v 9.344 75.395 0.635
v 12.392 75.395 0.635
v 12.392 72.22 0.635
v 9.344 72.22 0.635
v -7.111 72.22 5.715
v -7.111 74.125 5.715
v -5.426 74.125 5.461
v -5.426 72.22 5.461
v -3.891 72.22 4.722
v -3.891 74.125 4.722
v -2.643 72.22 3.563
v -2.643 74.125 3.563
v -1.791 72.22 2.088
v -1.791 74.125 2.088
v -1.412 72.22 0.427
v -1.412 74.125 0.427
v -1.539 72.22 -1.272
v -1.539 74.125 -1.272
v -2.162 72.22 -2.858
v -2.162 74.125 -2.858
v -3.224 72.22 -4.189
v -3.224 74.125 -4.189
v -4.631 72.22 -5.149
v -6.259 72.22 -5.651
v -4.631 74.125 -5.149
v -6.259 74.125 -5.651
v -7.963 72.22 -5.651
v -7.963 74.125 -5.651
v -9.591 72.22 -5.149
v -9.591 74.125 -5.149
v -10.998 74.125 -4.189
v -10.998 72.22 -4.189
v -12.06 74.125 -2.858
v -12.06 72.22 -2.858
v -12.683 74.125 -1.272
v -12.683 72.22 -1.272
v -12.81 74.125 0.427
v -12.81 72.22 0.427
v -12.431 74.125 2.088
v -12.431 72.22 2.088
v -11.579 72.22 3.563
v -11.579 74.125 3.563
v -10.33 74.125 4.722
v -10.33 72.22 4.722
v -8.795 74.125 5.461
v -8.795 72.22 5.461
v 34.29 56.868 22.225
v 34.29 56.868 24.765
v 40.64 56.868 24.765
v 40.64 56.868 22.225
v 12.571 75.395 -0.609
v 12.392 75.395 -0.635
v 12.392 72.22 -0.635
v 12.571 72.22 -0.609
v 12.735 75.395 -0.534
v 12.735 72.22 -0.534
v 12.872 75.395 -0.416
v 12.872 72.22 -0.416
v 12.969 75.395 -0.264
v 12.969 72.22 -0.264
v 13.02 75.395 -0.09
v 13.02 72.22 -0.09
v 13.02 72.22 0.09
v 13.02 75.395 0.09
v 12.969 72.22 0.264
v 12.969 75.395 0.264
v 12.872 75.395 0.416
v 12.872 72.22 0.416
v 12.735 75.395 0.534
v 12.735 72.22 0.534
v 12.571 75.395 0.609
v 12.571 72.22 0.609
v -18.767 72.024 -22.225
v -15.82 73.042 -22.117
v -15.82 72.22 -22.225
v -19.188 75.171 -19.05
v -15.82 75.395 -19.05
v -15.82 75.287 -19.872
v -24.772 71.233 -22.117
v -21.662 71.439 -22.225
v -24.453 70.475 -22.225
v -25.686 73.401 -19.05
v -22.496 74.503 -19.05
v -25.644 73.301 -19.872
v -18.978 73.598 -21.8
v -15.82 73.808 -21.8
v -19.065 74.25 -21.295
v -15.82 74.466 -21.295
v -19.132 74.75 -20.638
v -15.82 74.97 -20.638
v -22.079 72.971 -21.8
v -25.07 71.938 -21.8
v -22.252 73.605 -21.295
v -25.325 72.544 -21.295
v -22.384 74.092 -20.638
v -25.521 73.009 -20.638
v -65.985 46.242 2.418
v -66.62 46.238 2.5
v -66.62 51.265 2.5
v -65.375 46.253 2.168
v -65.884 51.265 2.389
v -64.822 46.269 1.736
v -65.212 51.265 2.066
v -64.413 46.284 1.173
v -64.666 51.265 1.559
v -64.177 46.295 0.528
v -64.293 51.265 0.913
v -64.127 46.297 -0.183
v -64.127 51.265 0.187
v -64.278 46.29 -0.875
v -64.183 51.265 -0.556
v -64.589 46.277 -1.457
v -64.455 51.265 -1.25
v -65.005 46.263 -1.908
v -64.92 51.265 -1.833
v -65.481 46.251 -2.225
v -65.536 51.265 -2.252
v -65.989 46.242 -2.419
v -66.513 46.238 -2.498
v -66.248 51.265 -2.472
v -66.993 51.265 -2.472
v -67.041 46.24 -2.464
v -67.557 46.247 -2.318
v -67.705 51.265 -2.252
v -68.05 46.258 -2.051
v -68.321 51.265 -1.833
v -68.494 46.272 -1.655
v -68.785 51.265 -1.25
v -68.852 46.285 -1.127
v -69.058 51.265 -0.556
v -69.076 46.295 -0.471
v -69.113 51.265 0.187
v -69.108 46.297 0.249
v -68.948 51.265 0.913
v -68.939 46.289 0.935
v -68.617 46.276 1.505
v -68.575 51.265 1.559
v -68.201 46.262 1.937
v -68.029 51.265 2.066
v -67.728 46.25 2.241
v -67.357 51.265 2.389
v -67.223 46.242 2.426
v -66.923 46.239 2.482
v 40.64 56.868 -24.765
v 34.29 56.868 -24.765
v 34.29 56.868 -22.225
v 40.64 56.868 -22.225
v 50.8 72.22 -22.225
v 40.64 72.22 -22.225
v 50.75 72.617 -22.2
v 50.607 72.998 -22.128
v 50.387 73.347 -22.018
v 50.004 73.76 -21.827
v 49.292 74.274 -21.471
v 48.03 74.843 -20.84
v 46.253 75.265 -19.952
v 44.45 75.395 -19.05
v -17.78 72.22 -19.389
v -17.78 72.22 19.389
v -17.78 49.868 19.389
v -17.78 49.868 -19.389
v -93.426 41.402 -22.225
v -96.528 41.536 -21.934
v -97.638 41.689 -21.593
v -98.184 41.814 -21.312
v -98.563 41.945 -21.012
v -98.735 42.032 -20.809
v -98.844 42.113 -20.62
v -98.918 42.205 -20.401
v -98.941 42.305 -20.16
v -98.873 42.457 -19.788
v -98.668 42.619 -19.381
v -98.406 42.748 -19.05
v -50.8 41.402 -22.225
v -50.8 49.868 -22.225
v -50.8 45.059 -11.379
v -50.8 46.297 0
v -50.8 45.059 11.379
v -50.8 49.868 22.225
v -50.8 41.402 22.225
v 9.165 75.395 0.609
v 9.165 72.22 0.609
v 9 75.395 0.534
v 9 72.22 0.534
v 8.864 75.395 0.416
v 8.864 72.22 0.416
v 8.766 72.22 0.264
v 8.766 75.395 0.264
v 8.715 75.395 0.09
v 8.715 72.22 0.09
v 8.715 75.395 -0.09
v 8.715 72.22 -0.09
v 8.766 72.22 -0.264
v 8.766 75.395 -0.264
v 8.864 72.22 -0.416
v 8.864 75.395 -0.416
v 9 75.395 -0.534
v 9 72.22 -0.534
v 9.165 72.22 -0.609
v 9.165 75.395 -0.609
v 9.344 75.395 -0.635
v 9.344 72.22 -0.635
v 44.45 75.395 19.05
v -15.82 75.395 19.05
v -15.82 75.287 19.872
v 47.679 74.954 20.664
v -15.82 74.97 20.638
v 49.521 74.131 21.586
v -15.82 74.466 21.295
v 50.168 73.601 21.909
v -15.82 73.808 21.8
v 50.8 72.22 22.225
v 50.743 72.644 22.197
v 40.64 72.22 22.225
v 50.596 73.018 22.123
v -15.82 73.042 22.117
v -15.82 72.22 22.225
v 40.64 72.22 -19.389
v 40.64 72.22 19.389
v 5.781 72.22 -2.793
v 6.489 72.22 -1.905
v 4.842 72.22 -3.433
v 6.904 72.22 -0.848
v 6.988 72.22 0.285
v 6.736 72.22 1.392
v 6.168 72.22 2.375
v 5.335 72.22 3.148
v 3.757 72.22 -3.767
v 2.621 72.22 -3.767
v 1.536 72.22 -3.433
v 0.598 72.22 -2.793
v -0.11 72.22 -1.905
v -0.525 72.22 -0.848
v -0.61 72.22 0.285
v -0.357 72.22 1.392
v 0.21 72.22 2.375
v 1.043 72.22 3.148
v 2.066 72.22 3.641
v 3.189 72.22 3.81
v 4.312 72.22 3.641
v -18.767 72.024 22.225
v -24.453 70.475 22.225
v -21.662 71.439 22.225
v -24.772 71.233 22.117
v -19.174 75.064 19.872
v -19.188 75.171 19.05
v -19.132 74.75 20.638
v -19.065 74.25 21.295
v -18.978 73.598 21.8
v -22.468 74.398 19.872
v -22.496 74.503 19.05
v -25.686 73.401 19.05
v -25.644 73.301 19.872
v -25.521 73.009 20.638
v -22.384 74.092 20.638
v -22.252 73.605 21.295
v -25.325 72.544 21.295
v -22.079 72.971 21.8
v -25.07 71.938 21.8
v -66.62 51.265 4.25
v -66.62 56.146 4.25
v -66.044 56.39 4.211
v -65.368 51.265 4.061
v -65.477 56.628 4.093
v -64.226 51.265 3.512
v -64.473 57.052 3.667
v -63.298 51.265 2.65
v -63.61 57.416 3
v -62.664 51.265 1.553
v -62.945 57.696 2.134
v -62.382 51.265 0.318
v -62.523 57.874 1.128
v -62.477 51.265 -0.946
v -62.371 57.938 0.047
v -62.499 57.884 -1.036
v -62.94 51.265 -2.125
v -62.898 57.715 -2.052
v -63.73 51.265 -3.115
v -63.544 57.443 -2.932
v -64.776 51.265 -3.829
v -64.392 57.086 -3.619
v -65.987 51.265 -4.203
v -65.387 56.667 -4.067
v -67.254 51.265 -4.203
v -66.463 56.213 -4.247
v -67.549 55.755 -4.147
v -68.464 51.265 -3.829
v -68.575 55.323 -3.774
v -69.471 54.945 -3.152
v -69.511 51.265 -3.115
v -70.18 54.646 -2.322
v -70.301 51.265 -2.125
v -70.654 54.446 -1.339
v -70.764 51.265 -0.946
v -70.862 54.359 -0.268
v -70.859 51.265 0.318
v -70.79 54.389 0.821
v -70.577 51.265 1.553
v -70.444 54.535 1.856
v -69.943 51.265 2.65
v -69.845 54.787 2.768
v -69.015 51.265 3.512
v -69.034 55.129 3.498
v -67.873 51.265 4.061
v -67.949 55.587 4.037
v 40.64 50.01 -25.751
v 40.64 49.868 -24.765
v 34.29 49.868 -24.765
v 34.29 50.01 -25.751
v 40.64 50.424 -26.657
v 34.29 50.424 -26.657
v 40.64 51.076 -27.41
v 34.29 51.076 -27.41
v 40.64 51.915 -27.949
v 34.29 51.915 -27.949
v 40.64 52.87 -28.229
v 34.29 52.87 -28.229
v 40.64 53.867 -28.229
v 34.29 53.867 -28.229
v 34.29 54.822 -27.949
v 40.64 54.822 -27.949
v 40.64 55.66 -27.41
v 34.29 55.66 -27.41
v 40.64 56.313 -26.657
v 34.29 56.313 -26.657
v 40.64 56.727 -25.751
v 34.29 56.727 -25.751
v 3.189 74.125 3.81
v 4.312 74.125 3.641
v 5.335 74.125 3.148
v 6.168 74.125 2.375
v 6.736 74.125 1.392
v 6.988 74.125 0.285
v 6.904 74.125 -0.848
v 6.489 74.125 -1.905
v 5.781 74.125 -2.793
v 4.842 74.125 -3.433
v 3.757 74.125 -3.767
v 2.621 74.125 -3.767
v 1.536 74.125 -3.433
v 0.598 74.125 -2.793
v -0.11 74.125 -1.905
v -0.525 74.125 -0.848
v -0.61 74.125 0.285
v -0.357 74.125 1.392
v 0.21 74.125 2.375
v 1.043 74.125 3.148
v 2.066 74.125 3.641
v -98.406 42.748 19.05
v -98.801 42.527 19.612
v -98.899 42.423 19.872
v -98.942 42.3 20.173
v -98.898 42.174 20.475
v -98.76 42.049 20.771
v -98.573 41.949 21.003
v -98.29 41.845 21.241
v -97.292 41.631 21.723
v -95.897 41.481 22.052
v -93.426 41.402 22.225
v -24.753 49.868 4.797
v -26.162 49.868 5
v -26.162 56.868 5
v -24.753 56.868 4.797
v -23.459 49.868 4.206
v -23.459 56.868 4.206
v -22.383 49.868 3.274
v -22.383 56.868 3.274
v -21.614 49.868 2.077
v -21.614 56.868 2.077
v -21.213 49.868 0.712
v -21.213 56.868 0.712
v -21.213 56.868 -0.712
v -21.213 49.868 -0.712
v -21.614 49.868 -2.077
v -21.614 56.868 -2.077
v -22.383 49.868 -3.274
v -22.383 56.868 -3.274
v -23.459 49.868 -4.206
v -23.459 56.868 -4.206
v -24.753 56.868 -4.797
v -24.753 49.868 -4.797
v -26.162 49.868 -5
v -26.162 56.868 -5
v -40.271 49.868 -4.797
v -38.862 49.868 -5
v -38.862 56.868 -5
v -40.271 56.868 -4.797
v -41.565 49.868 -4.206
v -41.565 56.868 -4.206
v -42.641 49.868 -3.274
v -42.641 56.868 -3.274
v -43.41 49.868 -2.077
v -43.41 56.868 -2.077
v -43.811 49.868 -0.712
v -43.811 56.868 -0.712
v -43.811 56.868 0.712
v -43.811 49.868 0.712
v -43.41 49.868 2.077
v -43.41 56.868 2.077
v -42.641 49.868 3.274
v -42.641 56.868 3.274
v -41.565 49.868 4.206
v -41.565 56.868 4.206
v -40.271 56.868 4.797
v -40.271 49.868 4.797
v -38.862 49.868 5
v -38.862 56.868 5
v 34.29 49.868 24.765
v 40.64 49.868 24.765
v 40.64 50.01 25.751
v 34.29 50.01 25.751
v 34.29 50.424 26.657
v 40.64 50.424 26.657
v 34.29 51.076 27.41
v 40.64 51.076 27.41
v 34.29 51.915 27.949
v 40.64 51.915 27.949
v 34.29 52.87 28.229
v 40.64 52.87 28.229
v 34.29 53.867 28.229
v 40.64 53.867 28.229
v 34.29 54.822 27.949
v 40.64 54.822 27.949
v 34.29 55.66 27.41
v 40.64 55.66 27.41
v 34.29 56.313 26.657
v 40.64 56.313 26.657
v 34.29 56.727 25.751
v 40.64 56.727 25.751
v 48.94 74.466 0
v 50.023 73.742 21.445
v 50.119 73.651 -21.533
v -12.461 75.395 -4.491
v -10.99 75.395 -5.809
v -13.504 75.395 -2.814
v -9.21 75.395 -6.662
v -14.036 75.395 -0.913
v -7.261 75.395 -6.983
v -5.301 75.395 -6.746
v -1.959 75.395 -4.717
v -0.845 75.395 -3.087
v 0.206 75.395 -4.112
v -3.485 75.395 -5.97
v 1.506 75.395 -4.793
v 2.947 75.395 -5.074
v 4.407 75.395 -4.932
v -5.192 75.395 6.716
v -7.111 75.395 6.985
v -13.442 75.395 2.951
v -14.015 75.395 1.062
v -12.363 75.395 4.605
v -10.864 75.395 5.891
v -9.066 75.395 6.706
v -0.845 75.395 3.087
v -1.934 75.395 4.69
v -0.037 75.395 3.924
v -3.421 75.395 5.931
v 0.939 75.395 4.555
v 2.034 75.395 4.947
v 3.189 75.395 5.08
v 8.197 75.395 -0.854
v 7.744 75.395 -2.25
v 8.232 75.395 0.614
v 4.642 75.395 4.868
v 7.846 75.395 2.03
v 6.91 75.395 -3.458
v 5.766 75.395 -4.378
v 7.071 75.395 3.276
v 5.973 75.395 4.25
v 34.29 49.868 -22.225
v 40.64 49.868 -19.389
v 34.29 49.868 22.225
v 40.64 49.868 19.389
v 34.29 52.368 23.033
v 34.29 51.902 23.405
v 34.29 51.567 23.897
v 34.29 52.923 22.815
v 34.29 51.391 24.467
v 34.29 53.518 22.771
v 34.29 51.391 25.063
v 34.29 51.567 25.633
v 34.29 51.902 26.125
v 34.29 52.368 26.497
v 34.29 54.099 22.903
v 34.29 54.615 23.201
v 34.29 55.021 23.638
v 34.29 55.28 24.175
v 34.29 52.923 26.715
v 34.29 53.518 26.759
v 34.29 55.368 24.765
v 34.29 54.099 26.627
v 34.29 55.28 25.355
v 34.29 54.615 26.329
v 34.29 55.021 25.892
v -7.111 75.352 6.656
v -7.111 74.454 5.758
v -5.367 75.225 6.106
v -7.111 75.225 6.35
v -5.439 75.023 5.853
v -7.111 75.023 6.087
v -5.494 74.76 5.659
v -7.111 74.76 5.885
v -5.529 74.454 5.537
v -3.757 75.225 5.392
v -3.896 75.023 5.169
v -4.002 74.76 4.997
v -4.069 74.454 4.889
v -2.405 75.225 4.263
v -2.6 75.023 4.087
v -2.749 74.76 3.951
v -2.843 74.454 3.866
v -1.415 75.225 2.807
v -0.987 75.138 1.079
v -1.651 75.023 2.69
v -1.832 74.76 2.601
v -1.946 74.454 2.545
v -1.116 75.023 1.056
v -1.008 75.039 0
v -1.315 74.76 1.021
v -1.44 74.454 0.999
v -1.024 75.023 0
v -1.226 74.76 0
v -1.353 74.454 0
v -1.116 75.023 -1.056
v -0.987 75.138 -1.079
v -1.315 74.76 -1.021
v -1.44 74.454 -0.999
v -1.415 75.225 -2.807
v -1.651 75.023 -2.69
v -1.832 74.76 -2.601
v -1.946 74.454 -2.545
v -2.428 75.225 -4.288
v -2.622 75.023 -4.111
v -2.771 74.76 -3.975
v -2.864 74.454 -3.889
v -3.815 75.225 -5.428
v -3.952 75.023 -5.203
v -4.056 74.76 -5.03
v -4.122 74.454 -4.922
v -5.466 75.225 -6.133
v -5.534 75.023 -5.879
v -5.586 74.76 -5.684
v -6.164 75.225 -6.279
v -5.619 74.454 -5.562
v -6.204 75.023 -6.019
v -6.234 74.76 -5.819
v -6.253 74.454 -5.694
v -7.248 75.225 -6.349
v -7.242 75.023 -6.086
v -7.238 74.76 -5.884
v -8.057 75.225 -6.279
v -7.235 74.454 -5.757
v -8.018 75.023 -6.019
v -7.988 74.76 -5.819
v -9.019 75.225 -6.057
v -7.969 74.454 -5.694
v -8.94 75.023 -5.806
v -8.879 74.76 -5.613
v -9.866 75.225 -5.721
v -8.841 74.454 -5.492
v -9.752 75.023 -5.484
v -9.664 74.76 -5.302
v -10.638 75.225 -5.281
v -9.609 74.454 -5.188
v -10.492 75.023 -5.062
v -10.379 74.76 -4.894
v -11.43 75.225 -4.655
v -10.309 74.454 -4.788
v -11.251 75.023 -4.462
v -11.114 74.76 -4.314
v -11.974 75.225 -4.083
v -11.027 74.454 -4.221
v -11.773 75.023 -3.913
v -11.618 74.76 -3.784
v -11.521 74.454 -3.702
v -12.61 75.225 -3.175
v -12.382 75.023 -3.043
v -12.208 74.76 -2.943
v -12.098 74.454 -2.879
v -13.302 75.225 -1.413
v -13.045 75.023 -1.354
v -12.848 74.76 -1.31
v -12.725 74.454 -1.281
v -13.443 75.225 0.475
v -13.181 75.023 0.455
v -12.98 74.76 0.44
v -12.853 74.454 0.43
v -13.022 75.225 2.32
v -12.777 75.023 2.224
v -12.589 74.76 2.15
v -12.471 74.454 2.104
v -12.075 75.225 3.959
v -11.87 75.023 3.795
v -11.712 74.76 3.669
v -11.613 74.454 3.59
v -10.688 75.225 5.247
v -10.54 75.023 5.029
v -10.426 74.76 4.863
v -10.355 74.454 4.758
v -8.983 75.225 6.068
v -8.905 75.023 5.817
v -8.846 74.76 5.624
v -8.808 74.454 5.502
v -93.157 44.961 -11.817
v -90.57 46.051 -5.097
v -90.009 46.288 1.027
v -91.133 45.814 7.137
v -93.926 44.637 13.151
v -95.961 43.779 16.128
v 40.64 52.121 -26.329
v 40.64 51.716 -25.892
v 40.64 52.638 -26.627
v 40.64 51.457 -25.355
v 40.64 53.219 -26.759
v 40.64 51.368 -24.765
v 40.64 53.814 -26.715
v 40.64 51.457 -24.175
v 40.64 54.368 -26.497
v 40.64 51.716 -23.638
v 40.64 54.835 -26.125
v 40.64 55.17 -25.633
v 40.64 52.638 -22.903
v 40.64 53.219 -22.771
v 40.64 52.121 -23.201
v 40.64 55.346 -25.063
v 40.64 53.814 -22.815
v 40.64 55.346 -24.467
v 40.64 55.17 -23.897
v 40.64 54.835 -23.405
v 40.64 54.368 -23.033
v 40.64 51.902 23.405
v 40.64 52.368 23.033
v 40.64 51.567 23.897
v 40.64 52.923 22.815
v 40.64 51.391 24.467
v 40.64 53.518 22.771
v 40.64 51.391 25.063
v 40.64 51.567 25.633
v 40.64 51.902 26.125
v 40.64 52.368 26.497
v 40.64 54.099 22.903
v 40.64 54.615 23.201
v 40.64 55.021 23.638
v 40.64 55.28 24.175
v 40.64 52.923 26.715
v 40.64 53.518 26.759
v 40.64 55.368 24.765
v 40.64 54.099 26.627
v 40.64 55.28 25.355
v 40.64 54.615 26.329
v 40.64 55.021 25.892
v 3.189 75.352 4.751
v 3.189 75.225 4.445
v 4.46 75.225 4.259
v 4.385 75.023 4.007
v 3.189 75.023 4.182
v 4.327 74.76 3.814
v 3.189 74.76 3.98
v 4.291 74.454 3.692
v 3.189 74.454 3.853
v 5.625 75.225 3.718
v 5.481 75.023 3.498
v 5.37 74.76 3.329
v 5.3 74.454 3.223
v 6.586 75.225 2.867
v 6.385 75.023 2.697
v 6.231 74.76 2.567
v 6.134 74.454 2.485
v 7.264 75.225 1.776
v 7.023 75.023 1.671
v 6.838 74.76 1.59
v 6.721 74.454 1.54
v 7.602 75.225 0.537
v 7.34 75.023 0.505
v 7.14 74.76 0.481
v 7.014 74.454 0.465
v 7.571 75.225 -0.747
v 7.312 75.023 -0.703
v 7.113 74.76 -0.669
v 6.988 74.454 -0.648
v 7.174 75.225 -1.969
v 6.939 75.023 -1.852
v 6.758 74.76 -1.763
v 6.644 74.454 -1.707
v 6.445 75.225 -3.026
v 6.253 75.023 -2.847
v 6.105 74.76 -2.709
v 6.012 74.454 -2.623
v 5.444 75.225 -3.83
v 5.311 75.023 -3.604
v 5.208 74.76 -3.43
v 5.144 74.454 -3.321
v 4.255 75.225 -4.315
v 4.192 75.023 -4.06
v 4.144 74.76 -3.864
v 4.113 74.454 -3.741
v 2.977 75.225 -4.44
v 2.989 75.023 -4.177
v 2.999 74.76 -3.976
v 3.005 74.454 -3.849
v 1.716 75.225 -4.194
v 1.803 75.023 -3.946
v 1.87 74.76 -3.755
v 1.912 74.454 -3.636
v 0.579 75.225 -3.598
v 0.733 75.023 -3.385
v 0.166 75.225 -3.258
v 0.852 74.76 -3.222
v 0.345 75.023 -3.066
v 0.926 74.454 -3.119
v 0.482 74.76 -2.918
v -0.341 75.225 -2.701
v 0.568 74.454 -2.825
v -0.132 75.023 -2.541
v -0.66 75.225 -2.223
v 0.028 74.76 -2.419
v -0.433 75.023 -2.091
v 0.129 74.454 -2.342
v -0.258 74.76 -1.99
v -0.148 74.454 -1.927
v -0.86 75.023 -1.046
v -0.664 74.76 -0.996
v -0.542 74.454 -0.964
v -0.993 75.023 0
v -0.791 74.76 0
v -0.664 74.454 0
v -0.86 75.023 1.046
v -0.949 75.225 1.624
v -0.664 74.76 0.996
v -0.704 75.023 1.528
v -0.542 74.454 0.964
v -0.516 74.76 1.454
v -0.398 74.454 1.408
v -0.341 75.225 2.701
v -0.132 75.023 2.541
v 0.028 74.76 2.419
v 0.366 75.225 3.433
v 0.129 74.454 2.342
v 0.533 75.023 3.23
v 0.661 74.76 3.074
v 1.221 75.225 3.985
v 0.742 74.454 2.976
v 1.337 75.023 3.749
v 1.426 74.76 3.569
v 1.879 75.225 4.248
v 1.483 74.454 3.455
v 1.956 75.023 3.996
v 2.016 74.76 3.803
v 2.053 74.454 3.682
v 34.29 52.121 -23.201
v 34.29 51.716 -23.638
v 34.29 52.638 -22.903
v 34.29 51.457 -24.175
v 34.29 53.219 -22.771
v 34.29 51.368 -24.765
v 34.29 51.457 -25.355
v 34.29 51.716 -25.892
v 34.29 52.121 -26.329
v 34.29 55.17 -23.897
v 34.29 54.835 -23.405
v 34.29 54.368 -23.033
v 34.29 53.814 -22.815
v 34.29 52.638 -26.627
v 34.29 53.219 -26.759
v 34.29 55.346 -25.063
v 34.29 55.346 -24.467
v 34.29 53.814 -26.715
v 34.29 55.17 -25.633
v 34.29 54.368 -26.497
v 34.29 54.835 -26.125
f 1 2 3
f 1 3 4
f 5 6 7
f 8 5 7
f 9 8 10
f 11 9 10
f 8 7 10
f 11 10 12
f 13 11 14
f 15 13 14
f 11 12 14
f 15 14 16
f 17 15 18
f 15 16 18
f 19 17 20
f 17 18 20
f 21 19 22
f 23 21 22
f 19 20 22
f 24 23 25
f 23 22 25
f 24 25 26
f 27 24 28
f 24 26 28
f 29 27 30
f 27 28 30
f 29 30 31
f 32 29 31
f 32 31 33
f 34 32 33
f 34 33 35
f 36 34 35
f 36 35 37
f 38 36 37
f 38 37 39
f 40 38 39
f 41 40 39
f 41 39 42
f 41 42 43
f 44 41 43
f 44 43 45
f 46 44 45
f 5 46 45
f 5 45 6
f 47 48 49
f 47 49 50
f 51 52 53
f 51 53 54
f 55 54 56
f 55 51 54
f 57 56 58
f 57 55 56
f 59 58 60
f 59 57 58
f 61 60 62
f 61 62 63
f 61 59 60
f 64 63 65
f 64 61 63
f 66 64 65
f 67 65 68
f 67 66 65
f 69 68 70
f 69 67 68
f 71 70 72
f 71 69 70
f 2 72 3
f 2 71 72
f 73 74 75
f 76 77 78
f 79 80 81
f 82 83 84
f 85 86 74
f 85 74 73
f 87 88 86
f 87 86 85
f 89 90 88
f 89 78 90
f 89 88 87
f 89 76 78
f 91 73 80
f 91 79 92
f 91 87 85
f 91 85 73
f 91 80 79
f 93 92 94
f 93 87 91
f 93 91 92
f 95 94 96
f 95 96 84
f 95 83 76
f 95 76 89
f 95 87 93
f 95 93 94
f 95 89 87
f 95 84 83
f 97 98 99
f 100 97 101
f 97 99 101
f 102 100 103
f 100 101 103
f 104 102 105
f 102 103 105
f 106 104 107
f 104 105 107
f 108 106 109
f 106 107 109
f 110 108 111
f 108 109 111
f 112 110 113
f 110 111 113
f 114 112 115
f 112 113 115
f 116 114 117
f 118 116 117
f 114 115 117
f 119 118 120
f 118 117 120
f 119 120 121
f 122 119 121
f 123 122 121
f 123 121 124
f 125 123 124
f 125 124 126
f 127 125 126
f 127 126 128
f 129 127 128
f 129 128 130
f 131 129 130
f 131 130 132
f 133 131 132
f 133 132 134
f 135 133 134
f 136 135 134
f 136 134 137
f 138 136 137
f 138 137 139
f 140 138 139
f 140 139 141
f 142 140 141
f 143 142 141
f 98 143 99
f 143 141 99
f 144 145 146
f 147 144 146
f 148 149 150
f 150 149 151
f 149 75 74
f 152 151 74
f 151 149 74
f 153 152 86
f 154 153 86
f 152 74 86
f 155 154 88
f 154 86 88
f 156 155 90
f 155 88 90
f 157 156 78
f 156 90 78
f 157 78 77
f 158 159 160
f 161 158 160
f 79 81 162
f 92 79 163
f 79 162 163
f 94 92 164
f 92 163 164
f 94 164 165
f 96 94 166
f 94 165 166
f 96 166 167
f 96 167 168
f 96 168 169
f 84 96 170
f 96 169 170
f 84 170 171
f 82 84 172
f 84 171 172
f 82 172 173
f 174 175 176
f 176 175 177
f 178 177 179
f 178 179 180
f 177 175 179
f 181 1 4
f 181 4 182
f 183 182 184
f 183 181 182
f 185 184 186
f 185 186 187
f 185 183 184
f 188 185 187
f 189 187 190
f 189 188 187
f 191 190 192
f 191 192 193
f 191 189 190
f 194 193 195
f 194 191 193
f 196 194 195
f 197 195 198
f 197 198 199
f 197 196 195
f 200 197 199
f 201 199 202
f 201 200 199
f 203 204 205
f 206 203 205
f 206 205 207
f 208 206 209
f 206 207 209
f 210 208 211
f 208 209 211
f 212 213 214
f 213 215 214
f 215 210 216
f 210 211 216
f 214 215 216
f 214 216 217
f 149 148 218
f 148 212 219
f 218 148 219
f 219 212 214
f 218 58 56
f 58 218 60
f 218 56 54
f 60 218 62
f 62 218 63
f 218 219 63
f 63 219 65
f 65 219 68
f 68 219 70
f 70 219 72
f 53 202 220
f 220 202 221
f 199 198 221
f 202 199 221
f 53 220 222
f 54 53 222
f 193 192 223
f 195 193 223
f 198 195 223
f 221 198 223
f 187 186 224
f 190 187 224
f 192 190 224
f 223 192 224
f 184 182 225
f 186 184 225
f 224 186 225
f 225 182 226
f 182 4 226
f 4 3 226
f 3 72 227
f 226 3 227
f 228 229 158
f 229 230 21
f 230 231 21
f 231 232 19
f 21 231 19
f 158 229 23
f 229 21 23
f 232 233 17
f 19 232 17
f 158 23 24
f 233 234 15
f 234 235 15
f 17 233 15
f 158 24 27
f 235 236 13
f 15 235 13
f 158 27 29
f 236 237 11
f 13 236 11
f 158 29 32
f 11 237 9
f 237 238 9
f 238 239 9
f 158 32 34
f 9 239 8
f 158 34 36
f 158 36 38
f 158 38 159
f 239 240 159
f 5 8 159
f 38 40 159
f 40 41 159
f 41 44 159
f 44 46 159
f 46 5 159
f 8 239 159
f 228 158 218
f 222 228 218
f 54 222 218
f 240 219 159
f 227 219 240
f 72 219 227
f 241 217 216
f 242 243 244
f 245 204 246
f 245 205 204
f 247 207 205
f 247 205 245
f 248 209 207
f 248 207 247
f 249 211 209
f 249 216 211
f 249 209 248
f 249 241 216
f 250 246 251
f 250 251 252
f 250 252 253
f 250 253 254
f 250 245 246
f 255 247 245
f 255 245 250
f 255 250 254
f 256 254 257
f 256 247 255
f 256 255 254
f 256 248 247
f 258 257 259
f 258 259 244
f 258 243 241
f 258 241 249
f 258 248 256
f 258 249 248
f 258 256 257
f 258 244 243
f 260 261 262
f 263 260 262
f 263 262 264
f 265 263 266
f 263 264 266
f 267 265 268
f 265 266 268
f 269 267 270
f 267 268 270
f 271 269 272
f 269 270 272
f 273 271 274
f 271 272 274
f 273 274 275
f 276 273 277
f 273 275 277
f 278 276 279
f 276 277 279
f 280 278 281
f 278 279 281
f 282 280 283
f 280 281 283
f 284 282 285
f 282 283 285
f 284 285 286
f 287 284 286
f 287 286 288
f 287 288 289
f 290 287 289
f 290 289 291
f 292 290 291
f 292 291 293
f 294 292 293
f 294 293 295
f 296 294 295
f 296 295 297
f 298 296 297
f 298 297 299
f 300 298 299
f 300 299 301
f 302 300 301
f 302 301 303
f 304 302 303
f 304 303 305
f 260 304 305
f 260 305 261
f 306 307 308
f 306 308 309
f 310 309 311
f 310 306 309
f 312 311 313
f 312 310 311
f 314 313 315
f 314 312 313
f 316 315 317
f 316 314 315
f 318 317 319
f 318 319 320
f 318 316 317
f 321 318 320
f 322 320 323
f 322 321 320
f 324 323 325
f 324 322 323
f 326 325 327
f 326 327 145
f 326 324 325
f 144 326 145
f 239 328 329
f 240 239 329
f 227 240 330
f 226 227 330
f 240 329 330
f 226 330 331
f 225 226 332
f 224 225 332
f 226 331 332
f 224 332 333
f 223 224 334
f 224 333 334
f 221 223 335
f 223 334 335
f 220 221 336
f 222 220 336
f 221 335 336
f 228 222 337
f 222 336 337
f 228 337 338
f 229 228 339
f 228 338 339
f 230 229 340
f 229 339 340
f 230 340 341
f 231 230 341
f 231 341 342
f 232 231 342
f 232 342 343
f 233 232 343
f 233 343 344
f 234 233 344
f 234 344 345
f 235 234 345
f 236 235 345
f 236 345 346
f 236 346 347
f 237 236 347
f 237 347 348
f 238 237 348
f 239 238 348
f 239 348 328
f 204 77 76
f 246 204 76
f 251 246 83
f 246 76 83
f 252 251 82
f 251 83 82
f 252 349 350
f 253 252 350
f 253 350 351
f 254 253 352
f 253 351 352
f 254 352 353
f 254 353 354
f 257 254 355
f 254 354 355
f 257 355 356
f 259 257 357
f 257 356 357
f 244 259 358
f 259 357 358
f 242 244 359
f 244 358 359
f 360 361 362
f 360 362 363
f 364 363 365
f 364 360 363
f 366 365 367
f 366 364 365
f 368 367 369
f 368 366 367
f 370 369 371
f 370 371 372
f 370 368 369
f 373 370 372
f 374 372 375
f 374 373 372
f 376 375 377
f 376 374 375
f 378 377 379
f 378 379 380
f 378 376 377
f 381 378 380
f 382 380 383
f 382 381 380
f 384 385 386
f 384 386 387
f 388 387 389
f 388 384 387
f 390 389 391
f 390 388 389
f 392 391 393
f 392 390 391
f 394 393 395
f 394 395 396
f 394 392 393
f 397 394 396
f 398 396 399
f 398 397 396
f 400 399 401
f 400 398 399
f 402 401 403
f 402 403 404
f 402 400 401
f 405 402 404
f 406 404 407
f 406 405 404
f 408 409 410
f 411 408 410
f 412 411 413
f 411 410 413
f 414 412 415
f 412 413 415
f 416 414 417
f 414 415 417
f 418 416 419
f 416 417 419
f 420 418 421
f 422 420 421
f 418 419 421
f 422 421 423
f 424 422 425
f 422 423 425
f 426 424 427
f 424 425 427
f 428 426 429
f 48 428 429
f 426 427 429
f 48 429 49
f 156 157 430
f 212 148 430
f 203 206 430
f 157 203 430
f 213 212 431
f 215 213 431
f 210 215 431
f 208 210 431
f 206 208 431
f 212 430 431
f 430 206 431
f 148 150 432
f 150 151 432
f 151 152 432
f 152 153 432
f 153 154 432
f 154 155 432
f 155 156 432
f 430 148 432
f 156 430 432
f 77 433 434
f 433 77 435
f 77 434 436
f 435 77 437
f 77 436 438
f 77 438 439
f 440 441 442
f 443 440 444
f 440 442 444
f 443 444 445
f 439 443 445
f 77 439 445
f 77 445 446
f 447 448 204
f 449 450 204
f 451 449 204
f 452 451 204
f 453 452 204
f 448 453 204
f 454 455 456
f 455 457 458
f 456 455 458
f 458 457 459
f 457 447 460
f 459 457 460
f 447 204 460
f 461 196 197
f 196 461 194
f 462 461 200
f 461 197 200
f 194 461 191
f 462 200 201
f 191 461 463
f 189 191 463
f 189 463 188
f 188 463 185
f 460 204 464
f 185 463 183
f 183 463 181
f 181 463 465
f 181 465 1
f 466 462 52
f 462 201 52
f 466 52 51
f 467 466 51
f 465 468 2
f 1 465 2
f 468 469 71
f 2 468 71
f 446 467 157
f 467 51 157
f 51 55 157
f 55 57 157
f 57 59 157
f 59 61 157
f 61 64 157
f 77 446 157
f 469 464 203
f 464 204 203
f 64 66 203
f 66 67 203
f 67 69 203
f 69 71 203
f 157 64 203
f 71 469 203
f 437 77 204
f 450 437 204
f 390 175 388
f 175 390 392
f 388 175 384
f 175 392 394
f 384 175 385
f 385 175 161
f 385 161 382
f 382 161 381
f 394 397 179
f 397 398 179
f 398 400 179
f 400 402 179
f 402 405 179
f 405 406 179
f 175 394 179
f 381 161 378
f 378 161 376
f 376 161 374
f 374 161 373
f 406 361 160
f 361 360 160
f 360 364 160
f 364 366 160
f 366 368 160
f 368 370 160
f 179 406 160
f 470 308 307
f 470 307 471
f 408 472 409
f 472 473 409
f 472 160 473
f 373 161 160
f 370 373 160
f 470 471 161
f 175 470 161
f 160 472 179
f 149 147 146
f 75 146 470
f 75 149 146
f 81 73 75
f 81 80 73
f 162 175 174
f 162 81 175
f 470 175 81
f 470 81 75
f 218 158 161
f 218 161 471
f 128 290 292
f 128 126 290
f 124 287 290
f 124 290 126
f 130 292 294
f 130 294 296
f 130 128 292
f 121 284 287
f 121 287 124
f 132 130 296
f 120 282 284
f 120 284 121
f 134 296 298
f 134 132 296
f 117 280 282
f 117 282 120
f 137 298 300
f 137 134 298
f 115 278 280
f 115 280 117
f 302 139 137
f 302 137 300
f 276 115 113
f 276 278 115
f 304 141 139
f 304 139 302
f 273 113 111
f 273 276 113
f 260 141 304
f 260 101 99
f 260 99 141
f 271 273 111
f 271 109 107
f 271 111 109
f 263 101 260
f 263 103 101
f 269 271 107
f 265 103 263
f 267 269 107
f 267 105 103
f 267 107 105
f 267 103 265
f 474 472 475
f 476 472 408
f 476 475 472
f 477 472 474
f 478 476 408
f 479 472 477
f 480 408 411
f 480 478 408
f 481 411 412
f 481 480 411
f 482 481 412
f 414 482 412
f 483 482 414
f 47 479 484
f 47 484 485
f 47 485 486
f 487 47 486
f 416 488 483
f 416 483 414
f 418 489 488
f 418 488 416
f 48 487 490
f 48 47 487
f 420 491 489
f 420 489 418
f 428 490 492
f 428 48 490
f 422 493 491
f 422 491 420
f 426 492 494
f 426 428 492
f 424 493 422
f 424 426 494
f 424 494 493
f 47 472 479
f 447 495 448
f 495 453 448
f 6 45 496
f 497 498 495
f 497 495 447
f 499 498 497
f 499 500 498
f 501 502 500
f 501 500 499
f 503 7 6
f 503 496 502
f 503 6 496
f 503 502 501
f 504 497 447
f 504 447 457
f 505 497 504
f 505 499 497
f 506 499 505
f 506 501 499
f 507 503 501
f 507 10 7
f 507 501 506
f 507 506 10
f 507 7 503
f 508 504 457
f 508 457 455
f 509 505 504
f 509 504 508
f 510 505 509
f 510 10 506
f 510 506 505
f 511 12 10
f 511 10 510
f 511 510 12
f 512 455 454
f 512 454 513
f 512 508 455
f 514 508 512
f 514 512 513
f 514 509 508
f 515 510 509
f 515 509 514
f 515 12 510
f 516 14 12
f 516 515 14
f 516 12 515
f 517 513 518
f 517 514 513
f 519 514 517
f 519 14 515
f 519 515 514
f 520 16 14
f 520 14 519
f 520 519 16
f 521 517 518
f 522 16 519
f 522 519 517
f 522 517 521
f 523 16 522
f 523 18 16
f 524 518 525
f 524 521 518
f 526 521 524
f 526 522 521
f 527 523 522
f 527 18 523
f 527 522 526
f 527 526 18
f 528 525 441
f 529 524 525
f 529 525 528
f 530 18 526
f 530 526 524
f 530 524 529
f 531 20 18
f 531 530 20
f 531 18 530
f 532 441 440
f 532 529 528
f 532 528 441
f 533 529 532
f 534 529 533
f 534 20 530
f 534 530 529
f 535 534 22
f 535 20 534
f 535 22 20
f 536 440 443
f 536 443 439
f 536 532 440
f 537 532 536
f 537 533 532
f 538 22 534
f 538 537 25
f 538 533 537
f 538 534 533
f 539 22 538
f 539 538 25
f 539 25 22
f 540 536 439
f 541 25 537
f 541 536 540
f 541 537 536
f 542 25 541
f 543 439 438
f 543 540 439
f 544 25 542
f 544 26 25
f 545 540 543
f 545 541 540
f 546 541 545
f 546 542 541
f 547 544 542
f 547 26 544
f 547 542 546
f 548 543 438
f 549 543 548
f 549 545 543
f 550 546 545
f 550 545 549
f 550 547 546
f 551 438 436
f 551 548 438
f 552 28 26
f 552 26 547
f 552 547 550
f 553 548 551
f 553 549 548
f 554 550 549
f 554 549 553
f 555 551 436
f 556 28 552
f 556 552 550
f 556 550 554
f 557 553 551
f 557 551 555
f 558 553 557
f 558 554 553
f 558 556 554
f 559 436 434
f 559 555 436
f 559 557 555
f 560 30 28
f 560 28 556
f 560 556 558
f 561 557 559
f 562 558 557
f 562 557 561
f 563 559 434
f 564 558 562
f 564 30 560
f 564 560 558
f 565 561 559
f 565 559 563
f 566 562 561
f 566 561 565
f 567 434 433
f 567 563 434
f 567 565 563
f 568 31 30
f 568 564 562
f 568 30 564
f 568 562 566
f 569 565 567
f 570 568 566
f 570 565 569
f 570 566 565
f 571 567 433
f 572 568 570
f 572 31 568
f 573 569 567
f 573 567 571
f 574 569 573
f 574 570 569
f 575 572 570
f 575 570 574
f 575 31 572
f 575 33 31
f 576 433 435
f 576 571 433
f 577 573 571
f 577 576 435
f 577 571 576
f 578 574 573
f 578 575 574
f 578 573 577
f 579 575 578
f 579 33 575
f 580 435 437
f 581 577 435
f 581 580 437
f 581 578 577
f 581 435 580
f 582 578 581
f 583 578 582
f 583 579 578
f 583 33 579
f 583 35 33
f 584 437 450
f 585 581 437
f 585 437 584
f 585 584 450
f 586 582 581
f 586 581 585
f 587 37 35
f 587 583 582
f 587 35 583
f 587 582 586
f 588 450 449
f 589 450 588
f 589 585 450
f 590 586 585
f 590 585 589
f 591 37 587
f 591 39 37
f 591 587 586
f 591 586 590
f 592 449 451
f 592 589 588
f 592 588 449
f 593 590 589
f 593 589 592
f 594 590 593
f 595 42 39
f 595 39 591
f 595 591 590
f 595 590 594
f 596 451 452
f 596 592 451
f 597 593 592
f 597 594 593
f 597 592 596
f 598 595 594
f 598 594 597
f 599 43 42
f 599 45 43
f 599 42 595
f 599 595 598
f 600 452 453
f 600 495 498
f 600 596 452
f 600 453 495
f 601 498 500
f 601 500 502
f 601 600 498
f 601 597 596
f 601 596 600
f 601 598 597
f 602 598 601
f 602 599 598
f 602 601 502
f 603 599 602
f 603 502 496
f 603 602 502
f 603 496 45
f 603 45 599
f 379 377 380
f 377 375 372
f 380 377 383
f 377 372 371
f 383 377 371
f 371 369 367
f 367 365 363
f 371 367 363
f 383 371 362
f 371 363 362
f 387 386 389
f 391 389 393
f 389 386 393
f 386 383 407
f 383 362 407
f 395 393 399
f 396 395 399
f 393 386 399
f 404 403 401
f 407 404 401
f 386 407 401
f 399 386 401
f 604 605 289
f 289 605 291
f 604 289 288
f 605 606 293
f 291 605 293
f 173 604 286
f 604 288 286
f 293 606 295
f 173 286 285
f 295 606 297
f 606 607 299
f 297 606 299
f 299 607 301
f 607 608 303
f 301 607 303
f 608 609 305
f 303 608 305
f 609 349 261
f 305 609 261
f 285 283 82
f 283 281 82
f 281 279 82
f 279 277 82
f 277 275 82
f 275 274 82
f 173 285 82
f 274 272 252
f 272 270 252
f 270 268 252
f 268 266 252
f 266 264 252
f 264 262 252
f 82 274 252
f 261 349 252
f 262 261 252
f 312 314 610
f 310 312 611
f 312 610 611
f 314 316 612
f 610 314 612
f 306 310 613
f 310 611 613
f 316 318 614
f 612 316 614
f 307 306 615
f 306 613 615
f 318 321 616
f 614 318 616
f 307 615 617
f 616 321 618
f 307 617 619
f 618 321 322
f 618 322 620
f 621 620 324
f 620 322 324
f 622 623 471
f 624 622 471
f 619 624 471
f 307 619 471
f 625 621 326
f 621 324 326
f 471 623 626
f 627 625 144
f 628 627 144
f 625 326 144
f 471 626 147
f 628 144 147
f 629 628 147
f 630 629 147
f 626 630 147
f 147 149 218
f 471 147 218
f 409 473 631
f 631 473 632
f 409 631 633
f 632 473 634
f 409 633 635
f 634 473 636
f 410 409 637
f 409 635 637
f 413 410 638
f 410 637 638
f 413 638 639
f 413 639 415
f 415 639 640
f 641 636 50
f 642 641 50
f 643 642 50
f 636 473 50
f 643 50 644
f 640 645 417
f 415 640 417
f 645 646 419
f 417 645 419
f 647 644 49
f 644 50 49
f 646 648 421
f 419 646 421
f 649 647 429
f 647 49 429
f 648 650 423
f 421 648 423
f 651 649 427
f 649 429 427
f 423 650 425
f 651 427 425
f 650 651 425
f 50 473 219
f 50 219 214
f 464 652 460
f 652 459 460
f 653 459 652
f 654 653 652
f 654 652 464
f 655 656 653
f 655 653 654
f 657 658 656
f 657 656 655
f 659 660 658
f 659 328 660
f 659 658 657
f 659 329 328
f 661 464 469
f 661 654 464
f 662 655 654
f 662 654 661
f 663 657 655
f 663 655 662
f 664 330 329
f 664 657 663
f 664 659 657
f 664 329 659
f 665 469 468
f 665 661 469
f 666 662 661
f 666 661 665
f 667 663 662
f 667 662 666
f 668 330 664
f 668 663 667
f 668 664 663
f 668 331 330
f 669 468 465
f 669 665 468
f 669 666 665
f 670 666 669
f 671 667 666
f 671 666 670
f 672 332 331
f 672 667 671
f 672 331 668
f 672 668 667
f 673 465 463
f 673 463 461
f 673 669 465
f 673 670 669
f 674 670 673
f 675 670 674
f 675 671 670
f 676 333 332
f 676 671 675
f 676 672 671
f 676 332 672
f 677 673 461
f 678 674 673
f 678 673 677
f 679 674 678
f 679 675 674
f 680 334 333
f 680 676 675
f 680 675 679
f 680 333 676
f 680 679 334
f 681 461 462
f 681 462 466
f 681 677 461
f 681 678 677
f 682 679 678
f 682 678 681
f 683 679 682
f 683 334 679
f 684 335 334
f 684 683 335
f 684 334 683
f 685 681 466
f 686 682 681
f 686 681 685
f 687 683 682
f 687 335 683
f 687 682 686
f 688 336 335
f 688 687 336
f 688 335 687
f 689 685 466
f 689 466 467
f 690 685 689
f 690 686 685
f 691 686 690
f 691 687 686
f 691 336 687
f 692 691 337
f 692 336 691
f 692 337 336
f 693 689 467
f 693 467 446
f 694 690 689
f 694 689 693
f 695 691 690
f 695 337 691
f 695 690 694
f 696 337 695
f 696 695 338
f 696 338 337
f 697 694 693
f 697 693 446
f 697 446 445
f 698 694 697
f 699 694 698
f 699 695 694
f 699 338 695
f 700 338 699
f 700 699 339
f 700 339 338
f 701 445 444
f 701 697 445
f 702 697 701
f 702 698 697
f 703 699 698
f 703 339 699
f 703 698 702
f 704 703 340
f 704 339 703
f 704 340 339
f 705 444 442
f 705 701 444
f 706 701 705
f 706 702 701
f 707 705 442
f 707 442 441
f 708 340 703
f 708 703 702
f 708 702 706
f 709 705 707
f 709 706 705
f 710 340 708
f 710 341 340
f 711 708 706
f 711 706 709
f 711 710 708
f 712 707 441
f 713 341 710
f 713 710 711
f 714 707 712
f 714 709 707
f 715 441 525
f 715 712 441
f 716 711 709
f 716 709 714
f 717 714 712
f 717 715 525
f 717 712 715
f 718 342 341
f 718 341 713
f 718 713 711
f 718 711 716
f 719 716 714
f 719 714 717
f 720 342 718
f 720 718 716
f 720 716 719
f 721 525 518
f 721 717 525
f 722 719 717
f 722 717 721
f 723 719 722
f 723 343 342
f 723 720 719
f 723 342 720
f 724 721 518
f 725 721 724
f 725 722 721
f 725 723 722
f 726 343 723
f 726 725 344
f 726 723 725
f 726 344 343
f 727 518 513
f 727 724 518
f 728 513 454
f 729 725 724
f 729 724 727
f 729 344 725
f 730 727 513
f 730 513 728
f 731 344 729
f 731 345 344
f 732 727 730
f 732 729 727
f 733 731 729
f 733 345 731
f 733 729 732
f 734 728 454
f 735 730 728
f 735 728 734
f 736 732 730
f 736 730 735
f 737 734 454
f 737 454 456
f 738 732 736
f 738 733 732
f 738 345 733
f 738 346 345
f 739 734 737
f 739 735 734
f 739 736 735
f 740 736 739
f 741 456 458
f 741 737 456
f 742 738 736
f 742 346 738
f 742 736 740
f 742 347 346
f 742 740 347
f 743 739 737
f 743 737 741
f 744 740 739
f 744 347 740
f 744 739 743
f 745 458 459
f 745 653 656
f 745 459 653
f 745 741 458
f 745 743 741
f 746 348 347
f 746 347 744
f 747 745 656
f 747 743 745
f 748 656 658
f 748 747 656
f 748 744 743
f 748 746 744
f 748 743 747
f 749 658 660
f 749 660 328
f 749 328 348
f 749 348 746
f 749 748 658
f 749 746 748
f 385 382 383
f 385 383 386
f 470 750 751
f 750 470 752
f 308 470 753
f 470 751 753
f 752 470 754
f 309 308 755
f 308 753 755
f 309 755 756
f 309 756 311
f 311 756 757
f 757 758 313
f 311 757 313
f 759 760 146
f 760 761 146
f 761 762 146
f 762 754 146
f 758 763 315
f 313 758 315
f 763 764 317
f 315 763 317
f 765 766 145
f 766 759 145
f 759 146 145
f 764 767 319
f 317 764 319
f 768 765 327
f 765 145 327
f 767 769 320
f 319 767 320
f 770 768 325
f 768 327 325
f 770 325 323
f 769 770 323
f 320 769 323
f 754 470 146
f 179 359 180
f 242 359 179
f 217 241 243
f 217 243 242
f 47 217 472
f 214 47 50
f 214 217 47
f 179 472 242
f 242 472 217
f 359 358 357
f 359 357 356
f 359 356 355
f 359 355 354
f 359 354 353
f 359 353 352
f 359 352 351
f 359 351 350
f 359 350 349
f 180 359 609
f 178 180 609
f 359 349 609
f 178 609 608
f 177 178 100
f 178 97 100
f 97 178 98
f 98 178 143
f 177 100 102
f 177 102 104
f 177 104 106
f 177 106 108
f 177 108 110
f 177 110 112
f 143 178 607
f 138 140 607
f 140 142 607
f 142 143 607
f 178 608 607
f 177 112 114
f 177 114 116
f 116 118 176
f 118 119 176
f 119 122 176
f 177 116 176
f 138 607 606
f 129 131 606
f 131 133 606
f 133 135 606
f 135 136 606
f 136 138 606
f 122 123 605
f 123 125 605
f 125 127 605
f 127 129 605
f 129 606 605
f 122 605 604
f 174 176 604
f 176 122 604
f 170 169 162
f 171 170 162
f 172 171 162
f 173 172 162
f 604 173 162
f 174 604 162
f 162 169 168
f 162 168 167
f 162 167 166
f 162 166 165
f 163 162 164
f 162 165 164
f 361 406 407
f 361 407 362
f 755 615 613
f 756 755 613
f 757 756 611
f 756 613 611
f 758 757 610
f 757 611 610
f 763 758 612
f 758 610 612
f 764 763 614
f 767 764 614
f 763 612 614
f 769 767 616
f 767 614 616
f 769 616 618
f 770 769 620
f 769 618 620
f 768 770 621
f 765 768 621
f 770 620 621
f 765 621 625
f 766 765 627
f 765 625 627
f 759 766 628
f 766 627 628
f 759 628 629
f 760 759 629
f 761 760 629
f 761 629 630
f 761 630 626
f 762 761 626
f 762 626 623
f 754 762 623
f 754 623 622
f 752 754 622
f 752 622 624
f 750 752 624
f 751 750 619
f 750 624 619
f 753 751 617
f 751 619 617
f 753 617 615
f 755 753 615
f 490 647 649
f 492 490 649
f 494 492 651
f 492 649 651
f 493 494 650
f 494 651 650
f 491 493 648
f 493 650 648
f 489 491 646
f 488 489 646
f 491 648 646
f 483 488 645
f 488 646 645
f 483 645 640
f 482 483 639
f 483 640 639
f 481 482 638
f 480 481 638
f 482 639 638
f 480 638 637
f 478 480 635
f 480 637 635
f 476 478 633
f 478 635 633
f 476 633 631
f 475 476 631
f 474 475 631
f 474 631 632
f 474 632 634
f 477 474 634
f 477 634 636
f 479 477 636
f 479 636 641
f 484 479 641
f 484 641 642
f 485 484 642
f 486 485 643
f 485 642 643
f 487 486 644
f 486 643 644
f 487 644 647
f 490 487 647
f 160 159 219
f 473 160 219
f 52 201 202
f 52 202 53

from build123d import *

# Parameters (mm, degrees)
BOSS_EXTRUDE1_DEPTH     = 22.225
FILLET1_R               = 25.4
CUT_EXTRUDE1_DEPTH      = 129.456170755
CUT_EXTRUDE1_DEPTH_BACK = 129.456170755
SKETCH2_W               = 58.42
SKETCH2_H               = 2.835975014
BOSS_EXTRUDE2_DEPTH     = 22.352
FILLET2_SIZE            = 3.175
FILLET2_SIZE_2          = 6.35
SKETCH4_R               = 5.715
SKETCH4_R_2             = 3.81
CUT_EXTRUDE2_DEPTH      = 3.175
FILLET4_R               = 1.27
SKETCH5_R               = 2.5
CUT_EXTRUDE3_DEPTH      = 110.417000644
CUT_EXTRUDE5_DEPTH      = 7
SKETCH8_R               = 2
BOSS_EXTRUDE3_DEPTH     = 6.35
FILLET3_R               = 3.175
SKETCH6_R               = 4.25
CUT_EXTRUDE8_DEPTH      = 24.13


with BuildPart() as part:
    # Sketch1 → Boss-Extrude1 (new, symmetric)
    with BuildSketch(Plane.XY):
        Polygon((-17.78, 72.220471881), (-17.78, 49.868471881), (-50.8, 49.868471881), (-50.8, 41.401805214), (-101.6, 41.401805214), (-20.955, 75.395471881), (50.8, 75.395471881), (50.8, 72.220471881), align=None)
    extrude(amount=BOSS_EXTRUDE1_DEPTH, both=True)

    # Fillet1
    fillet1_edges = [part.edges().sort_by_distance(p)[0] for p in [
        (-20.955, 75.395471881, 0),
    ]]
    fillet(fillet1_edges, radius=FILLET1_R)

    # Sketch3 → Cut-Extrude1 (cut, two sides: drawn at the far end of the back side and taken through both)
    with BuildSketch(Plane(origin=(-50.8, 0, 0), x_dir=(0, 0, -1), z_dir=(1, 0, 0)).offset(-CUT_EXTRUDE1_DEPTH_BACK)):
        with BuildLine():
            Line((-132.858425435, -9.823961327), (-22.225, 41.401805214))
            ThreePointArc((-22.225, 41.401805214), (0, 46.297479222), (22.225, 41.401805214))
            Line((22.225, 41.401805214), (132.858425435, -9.823961327))
            Line((132.858425435, -9.823961327), (132.858425435, -253.658610064))
            Line((132.858425435, -253.658610064), (-132.858425435, -253.658610064))
            Line((-132.858425435, -253.658610064), (-132.858425435, -9.823961327))
        make_face()
    extrude(amount=CUT_EXTRUDE1_DEPTH + CUT_EXTRUDE1_DEPTH_BACK, mode=Mode.SUBTRACT)

    # Sketch2 → Boss-Extrude2 (add)
    with BuildSketch(Plane.XZ.offset(-72.220471881)):
        with Locations((11.43, 20.807012493)):
            Rectangle(SKETCH2_W, SKETCH2_H)
        with Locations((11.43, -20.807012493)):
            Rectangle(SKETCH2_W, SKETCH2_H)
    extrude(amount=BOSS_EXTRUDE2_DEPTH)

    # Fillet2
    # an asymmetric fillet: 6.35, 3.175 mm, written as the material it takes off along each edge
    with BuildSketch(Plane(origin=(50.8, 75.395471881, -38.1), x_dir=(0, -1, 0), z_dir=(0, 0, 1))) as fillet2_piece_1:
        with BuildLine():
            Bezier((FILLET2_SIZE, 0), (0, 0), (0, -FILLET2_SIZE_2), weights=[1, 0.707106781, 1])
            Line((0, -FILLET2_SIZE_2), (0, 0))
            Line((0, 0), (FILLET2_SIZE, 0))
        make_face()
    extrude(amount=76.2, mode=Mode.SUBTRACT)

    # Sketch4 → Cut-Extrude2 (cut)
    with BuildSketch(Plane(origin=(0, 75.395471881, 0), x_dir=(1, 0, 0), z_dir=(0, 1, 0))):
        with Locations(Location((-7.110857048, 0, 0), (0, 0, 270))):
            Circle(SKETCH4_R)
        with Locations(Location((3.189142952, 0, 0), (0, 0, 270))):
            Circle(SKETCH4_R_2)
        with BuildLine():
            Line((9.34361728, 0.635), (12.39161728, 0.635))
            ThreePointArc((12.39161728, 0.635), (13.02661728, 0), (12.39161728, -0.635))
            Line((12.39161728, -0.635), (9.34361728, -0.635))
            ThreePointArc((9.34361728, -0.635), (8.70861728, 0), (9.34361728, 0.635))
        make_face()
    extrude(amount=-CUT_EXTRUDE2_DEPTH, mode=Mode.SUBTRACT)

    # Fillet4
    # the kernel refuses this fillet: 1.27 mm, written as the material it takes off along each edge
    with BuildSketch(Plane(origin=(-7.110857048, 75.395471881, 0), x_dir=(0, 0, 1), z_dir=(-1, 0, 0))) as fillet4_piece_1:
        with BuildLine():
            CenterArc((5.715 + FILLET4_R, -FILLET4_R), FILLET4_R, 90, 90)
            Line((5.715, -FILLET4_R), (5.715, 0))
            Line((5.715, 0), (5.715 + FILLET4_R, 0))
        make_face()
    revolve(axis=Axis((-7.110857048, 75.395471881, 0), (0, 1, 0)), mode=Mode.SUBTRACT)
    with BuildSketch(Plane(origin=(3.189142952, 75.395471881, 0), x_dir=(0, 0, 1), z_dir=(-1, 0, 0))) as fillet4_piece_2:
        with BuildLine():
            CenterArc((3.81 + FILLET4_R, -FILLET4_R), FILLET4_R, 90, 90)
            Line((3.81, -FILLET4_R), (3.81, 0))
            Line((3.81, 0), (3.81 + FILLET4_R, 0))
        make_face()
    revolve(axis=Axis((3.189142952, 75.395471881, 0), (0, 1, 0)), mode=Mode.SUBTRACT)

    # Sketch5 → Cut-Extrude3 (cut, through all)
    with BuildSketch(Plane(origin=(0, 75.395471881, 0), x_dir=(1, 0, 0), z_dir=(0, 1, 0))):
        with Locations(Location((-66.620425581, 0, 0), (0, 0, 270))):
            Circle(SKETCH5_R)
    extrude(amount=-CUT_EXTRUDE3_DEPTH, mode=Mode.SUBTRACT)

    # Sketch7 → Cut-Extrude5 (cut)
    with BuildSketch(Plane.XZ.offset(-49.868471881)):
        with BuildLine():
            Line((-38.862, 5), (-26.162, 5))
            ThreePointArc((-26.162, 5), (-21.162, 0), (-26.162, -5))
            Line((-26.162, -5), (-38.862, -5))
            ThreePointArc((-38.862, -5), (-43.862, 0), (-38.862, 5))
        make_face()
    extrude(amount=-CUT_EXTRUDE5_DEPTH, mode=Mode.SUBTRACT)

    # Sketch8 → Boss-Extrude3 (add)
    # profile 1 of 2: a face of its own
    with BuildSketch(Plane(origin=(40.64, 0, 0), x_dir=(0, 0, -1), z_dir=(1, 0, 0))):
        with BuildLine():
            Line((-22.225, 49.868471881), (-24.765, 49.868471881))
            ThreePointArc((-24.765, 49.868471881), (-28.265, 53.368471881), (-24.765, 56.868471881))
            Line((-24.765, 56.868471881), (-22.225, 56.868471881))
            Line((-22.225, 56.868471881), (-22.225, 49.868471881))
        make_face()
        with Locations(Location((-24.765, 53.368471881, 0), (0, 0, 90))):
            Circle(SKETCH8_R, mode=Mode.SUBTRACT)
    # profile 2 of 2: a face of its own
    with BuildSketch(Plane(origin=(40.64, 0, 0), x_dir=(0, 0, -1), z_dir=(1, 0, 0))):
        with BuildLine():
            Line((22.225, 56.868471881), (22.225, 49.868471881))
            Line((22.225, 49.868471881), (24.765, 49.868471881))
            ThreePointArc((24.765, 49.868471881), (28.265, 53.368471881), (24.765, 56.868471881))
            Line((24.765, 56.868471881), (22.225, 56.868471881))
        make_face()
        with Locations(Location((24.765, 53.368471881, 0), (0, 0, 270))):
            Circle(SKETCH8_R, mode=Mode.SUBTRACT)
    extrude(amount=-BOSS_EXTRUDE3_DEPTH)

    # Fillet3
    # the kernel refuses this fillet: 3.175 mm, written as the material it takes off along each edge
    with BuildSketch(Plane(origin=(-15.820425581, 75.395471881, -22.225), x_dir=(0, -1, 0), z_dir=(1, 0, 0))) as fillet3_piece_1:
        with BuildLine():
            CenterArc((FILLET3_R, -FILLET3_R), FILLET3_R, 90, 90)
            Line((0, -FILLET3_R), (0, 0))
            Line((0, 0), (FILLET3_R, 0))
        make_face()
    extrude(amount=68.207925581, mode=Mode.SUBTRACT)
    with BuildSketch(Plane(origin=(-15.820425581, 49.995471881, -22.225), x_dir=(0, 1, 0), z_dir=(1, 0, 0))) as fillet3_piece_2:
        with BuildLine():
            CenterArc((25.4 - FILLET3_R, FILLET3_R), FILLET3_R, 270, 90)
            Line((25.4 - FILLET3_R, 0), (25.4, 0))
            Line((25.4, 0), (25.4, FILLET3_R))
        make_face()
    revolve(axis=Axis((-15.820425581, 49.995471881, -22.225), (0, 0, 1)), revolution_arc=22.856508496, mode=Mode.SUBTRACT)
    with BuildSketch(Plane(origin=(-108.914251568, 38.318685, -22.225), x_dir=(0.38842459395806633, -0.921480512440991, 0), z_dir=(0.921480512440991, 0.38842459395806633, 0))) as fillet3_piece_3:
        with BuildLine():
            CenterArc((FILLET3_R, -FILLET3_R), FILLET3_R, 90, 90)
            Line((0, -FILLET3_R), (0, 0))
            Line((0, 0), (FILLET3_R, 0))
        make_face()
    extrude(amount=90.319697679, mode=Mode.SUBTRACT)
    with BuildSketch(Plane(origin=(-108.914251568, 38.318685, 22.225), x_dir=(0.38842459395806633, -0.921480512440991, 0), z_dir=(0.921480512440991, 0.38842459395806633, 0))) as fillet3_piece_4:
        with BuildLine():
            CenterArc((FILLET3_R, FILLET3_R), FILLET3_R, 180, 90)
            Line((0, FILLET3_R), (0, 0))
            Line((0, 0), (FILLET3_R, 0))
        make_face()
    extrude(amount=90.319697679, mode=Mode.SUBTRACT)
    with BuildSketch(Plane(origin=(-15.820425581, 49.995471881, 22.225), x_dir=(0, 1, 0), z_dir=(1, 0, 0))) as fillet3_piece_5:
        with BuildLine():
            CenterArc((25.4 - FILLET3_R, -FILLET3_R), FILLET3_R, 0, 90)
            Line((25.4, -FILLET3_R), (25.4, 0))
            Line((25.4, 0), (25.4 - FILLET3_R, 0))
        make_face()
    revolve(axis=Axis((-15.820425581, 49.995471881, 22.225), (0, 0, 1)), revolution_arc=22.856508496, mode=Mode.SUBTRACT)
    with BuildSketch(Plane(origin=(-15.820425581, 75.395471881, 22.225), x_dir=(0, -1, 0), z_dir=(1, 0, 0))) as fillet3_piece_6:
        with BuildLine():
            CenterArc((FILLET3_R, FILLET3_R), FILLET3_R, 180, 90)
            Line((0, FILLET3_R), (0, 0))
            Line((0, 0), (FILLET3_R, 0))
        make_face()
    extrude(amount=68.207925581, mode=Mode.SUBTRACT)

    # Sketch6 → Cut-Extrude8 (cut)
    with BuildSketch(Plane(origin=(0, 75.395471881, 0), x_dir=(1, 0, 0), z_dir=(0, 1, 0))):
        with Locations(Location((-66.620425581, 0, 0), (0, 0, 270))):
            Circle(SKETCH6_R)
    extrude(amount=-CUT_EXTRUDE8_DEPTH, mode=Mode.SUBTRACT)


solid = part.part
